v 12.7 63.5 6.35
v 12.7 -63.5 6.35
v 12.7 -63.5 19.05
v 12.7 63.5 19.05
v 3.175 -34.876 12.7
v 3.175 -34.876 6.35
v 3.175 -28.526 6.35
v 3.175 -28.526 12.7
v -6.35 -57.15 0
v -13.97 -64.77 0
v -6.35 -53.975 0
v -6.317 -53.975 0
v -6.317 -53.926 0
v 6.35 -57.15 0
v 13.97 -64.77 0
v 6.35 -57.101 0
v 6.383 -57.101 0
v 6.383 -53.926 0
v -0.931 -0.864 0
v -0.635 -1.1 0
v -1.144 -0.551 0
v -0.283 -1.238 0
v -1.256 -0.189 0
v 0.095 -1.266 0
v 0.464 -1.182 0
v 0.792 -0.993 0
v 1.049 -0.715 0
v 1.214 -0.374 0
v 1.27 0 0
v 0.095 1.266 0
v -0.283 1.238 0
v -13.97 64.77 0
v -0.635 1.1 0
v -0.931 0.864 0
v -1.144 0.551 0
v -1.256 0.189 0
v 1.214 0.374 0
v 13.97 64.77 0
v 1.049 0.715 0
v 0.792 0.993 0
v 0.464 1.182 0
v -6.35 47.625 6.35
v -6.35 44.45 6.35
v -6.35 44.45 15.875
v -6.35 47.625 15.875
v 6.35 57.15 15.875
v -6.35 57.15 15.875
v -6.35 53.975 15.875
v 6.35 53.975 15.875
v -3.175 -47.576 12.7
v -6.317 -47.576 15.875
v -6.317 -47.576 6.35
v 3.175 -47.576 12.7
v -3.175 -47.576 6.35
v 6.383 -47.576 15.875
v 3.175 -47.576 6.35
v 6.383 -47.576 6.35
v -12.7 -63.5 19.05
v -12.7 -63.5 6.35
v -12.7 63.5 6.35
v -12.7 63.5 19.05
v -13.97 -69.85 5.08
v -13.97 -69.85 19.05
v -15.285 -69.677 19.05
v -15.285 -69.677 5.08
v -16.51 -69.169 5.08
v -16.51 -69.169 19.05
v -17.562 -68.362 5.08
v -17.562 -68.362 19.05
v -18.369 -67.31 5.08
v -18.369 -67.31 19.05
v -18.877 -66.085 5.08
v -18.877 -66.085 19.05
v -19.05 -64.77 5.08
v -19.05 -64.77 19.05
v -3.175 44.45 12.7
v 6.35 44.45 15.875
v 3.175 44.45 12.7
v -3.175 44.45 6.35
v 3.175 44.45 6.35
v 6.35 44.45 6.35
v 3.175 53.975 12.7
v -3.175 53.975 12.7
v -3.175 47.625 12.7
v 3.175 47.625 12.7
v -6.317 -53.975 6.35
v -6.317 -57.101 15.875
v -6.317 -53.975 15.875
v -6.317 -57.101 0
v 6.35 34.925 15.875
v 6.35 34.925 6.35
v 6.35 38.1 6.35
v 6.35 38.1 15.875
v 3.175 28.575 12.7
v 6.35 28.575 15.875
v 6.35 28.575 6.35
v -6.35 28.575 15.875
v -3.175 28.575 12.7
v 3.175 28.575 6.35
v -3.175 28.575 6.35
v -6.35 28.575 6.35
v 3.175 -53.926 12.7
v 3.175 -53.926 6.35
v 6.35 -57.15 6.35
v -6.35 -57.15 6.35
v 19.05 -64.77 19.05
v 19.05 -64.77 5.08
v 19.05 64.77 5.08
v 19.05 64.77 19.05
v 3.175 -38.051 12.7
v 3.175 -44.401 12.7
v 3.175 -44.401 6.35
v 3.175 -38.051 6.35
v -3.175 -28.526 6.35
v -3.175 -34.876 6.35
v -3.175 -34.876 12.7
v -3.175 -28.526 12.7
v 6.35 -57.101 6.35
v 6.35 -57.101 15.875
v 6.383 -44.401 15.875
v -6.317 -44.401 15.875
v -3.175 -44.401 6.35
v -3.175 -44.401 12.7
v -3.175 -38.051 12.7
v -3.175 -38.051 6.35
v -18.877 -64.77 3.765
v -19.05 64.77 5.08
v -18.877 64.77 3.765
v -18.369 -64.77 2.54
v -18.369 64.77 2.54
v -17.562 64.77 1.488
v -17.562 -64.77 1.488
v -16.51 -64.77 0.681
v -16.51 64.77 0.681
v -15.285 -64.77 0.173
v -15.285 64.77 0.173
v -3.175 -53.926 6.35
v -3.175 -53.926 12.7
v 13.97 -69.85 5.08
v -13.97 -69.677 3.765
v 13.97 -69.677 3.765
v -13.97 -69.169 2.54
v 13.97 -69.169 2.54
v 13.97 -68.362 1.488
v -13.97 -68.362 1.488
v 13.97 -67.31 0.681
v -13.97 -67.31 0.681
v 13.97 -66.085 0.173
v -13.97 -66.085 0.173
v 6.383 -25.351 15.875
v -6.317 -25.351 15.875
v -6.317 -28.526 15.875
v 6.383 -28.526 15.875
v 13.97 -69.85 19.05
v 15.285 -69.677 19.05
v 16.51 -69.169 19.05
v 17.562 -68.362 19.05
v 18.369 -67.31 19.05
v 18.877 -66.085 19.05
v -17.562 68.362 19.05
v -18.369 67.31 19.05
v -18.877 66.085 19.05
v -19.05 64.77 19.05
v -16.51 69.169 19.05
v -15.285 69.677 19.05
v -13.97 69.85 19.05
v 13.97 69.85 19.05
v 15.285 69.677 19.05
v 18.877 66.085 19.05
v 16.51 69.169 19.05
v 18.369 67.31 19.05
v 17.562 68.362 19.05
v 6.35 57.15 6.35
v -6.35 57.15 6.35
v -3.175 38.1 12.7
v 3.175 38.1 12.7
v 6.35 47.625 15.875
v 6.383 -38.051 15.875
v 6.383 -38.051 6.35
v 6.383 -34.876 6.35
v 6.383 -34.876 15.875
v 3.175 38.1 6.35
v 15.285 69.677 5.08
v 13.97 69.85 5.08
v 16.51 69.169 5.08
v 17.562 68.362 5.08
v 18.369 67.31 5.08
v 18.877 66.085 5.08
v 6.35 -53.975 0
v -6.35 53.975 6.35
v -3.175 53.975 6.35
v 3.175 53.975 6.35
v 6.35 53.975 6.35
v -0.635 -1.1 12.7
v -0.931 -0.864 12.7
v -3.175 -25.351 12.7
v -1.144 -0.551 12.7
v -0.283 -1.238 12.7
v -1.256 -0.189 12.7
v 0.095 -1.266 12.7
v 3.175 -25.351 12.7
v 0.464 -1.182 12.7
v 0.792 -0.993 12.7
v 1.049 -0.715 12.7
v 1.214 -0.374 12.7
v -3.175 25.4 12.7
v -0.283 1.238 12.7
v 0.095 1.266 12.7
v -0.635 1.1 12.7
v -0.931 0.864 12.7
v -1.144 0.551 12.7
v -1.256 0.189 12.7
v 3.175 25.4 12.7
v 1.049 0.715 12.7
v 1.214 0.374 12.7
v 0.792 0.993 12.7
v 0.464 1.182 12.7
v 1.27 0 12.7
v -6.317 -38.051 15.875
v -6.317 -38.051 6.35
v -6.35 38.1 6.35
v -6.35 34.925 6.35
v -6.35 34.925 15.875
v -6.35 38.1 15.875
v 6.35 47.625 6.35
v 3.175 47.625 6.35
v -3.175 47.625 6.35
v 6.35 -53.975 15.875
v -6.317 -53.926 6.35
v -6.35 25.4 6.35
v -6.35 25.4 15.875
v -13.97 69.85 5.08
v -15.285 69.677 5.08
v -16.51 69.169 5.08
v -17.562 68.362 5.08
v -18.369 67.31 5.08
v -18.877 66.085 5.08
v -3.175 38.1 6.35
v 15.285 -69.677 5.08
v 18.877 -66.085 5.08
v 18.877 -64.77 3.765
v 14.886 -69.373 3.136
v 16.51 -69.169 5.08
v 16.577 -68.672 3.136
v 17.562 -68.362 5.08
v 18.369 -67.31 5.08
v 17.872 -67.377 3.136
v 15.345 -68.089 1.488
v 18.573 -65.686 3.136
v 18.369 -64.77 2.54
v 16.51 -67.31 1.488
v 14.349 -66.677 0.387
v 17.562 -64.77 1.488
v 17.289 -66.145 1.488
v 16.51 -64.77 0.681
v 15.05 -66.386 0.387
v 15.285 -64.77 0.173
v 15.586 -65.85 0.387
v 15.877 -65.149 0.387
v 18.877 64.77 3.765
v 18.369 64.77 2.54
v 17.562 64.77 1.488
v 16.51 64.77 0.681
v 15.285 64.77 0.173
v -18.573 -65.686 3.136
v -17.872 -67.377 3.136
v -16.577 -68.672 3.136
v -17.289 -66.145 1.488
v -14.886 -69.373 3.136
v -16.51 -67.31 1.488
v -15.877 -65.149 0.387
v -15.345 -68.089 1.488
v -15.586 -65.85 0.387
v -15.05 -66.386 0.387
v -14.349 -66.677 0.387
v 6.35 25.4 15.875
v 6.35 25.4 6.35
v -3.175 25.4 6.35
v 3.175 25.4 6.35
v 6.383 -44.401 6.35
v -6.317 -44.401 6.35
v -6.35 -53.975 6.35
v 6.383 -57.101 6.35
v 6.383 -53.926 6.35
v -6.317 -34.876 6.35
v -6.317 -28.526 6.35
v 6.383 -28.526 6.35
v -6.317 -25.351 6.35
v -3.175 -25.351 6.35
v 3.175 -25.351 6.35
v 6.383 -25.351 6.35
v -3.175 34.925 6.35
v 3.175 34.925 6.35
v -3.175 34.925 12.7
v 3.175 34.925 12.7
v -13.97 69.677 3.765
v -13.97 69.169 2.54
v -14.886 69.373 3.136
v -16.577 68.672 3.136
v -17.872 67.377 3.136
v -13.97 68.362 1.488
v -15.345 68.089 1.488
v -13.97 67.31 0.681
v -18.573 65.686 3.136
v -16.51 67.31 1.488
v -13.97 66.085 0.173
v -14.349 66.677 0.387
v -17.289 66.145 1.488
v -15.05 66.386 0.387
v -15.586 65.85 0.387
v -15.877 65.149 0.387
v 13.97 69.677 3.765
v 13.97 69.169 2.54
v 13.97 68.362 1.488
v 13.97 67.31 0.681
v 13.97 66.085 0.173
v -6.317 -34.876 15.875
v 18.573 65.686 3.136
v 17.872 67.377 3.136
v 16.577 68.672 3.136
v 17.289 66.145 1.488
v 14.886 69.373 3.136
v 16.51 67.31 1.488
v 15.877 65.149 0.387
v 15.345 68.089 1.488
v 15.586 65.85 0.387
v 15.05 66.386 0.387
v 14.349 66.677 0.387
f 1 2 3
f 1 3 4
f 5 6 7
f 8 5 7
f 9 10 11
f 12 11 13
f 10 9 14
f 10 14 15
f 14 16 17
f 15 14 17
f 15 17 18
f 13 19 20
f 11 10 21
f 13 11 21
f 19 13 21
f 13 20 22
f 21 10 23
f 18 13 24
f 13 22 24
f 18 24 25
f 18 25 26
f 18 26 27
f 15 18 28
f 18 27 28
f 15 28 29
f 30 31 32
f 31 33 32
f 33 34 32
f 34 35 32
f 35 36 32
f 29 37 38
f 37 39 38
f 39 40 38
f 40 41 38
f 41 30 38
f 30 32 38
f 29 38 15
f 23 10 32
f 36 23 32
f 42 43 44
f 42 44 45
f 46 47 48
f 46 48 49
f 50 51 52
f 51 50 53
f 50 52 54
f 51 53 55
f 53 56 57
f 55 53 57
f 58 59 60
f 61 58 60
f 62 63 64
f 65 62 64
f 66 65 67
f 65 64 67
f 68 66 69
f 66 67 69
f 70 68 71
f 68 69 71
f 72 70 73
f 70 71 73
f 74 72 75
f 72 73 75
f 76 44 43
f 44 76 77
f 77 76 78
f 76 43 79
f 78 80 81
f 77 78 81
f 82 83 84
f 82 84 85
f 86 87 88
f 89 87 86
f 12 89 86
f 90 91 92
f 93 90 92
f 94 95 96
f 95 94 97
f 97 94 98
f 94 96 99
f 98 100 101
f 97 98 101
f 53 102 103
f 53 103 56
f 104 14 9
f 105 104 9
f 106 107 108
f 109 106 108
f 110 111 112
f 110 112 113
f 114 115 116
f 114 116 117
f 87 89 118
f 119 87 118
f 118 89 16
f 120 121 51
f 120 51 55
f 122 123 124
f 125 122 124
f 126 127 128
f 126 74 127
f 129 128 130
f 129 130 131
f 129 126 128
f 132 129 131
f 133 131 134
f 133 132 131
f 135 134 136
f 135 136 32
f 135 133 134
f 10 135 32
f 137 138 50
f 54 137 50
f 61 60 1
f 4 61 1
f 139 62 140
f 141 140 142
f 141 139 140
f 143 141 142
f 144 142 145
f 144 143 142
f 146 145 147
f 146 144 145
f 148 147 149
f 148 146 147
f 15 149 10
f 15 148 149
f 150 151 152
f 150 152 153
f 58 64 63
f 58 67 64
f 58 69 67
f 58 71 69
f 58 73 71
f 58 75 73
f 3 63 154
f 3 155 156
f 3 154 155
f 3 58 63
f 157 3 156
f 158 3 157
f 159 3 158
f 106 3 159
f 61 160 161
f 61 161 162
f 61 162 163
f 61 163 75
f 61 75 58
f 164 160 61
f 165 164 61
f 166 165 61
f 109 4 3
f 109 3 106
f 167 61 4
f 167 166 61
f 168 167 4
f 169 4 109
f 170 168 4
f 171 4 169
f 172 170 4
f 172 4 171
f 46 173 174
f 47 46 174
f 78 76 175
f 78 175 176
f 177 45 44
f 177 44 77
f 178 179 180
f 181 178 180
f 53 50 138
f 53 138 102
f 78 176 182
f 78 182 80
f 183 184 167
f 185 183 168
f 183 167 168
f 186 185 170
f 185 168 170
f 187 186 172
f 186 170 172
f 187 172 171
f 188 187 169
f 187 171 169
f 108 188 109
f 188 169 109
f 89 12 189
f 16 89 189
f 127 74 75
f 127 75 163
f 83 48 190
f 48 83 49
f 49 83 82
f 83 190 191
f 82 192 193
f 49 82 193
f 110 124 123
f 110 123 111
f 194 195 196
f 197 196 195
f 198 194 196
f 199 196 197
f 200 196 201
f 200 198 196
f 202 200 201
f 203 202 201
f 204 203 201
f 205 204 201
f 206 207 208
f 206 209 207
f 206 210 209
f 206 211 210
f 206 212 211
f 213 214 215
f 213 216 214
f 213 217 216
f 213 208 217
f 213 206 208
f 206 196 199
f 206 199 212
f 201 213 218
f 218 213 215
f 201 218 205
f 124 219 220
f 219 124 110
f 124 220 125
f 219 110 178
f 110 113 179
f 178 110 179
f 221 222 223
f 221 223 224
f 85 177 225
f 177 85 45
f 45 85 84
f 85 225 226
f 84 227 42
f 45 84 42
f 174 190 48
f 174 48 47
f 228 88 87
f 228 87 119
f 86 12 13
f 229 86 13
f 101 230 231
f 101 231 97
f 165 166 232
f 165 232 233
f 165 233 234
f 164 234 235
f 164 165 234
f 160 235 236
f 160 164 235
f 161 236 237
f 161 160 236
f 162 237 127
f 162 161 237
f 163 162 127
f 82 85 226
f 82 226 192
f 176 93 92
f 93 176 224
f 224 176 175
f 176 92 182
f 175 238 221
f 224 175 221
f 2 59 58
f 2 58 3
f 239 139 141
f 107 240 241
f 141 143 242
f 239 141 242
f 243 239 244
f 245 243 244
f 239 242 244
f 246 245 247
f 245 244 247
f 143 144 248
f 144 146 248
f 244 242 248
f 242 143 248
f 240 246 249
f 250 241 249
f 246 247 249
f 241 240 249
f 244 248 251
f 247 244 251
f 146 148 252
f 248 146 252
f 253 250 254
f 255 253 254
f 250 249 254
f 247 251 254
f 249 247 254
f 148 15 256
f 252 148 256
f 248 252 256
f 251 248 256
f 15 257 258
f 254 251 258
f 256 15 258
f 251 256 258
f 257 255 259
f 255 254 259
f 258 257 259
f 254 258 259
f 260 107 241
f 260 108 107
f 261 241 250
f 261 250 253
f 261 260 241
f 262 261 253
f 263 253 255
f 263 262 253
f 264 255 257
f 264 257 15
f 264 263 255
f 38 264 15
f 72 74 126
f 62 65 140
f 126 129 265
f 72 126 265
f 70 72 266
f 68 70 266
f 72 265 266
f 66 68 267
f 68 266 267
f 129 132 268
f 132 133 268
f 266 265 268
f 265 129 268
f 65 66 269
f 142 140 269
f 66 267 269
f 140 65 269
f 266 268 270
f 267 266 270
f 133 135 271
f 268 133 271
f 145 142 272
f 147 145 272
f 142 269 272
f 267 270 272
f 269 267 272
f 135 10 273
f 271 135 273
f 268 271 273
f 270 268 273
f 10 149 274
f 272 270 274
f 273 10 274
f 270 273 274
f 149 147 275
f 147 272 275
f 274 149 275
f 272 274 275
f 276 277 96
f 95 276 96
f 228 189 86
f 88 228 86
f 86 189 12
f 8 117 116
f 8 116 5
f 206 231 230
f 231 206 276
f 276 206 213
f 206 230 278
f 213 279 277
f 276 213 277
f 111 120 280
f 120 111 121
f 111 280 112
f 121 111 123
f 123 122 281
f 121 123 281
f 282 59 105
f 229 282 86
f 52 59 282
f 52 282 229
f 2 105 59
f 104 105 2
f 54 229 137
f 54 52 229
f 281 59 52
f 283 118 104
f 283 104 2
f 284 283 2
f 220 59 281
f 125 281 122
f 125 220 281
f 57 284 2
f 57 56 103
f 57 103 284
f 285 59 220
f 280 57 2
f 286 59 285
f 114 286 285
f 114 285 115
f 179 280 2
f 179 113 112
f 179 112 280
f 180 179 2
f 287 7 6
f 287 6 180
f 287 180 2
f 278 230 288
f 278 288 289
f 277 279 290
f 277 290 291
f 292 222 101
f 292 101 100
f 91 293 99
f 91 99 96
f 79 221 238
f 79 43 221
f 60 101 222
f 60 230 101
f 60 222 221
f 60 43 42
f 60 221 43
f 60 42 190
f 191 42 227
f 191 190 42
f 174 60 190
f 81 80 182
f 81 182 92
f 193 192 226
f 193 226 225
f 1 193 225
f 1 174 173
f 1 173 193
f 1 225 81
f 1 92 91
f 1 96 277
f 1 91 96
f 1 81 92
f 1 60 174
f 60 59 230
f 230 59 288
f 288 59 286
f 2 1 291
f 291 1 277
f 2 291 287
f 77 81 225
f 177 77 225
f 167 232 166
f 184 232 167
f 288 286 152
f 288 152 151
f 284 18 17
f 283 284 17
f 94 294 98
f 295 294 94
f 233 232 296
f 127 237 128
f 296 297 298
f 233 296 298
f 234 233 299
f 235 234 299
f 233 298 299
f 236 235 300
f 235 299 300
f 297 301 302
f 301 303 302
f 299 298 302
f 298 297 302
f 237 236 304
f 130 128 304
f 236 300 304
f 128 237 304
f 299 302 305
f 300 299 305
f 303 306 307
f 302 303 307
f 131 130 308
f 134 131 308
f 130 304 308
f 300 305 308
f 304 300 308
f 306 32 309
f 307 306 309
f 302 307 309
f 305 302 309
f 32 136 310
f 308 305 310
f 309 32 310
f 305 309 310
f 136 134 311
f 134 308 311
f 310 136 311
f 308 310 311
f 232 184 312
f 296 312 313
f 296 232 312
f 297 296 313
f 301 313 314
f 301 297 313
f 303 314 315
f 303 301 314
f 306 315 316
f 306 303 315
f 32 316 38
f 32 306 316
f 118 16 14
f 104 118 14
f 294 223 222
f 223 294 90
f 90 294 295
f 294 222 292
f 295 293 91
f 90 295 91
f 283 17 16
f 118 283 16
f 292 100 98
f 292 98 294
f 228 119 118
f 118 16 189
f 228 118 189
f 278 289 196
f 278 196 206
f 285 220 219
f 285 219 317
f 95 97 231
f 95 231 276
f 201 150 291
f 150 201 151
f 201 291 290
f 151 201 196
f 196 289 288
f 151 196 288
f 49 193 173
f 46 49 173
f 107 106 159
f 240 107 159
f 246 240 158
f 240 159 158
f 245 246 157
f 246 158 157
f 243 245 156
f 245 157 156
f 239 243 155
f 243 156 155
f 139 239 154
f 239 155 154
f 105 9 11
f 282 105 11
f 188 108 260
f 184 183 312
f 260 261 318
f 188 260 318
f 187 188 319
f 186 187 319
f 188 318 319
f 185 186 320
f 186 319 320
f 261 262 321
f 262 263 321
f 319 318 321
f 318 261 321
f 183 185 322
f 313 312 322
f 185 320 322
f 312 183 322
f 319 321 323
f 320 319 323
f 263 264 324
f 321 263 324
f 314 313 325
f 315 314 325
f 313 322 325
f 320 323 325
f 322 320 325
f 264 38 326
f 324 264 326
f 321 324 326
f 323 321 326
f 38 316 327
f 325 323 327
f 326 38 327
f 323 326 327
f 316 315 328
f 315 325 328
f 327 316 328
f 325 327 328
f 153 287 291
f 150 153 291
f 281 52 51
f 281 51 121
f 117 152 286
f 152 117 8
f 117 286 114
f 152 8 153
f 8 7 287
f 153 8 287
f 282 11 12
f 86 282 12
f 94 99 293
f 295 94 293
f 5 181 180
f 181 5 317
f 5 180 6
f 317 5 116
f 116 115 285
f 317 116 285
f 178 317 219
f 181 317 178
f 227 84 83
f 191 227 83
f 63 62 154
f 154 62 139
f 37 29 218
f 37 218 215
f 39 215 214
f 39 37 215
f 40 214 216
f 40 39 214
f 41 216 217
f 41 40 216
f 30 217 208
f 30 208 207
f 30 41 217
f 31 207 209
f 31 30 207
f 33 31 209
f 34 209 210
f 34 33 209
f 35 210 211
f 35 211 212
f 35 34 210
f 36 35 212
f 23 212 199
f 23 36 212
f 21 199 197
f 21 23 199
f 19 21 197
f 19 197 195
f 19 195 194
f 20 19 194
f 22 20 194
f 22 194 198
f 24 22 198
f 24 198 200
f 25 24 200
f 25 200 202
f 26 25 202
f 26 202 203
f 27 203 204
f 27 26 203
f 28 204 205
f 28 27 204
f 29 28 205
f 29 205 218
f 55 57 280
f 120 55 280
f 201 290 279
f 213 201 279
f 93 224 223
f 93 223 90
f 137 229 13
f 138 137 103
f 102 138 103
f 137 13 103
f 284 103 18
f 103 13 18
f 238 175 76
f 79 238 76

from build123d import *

# Parameters (mm, degrees)
F0_W     = 38.1
F0_H     = 139.7
F0_W_2   = 25.4
F0_H_2   = 127
F1_DEPTH = 19.05
F2_DEPTH = 6.35
F0_W_3   = 6.35
F0_H_3   = 50.7511039019
F0_R     = 1.27
F0_H_4   = 6.35
F3_DEPTH = 12.7
F0_H_5   = 3.175
F0_W_4   = 3.175
F0_W_5   = 3.141760166
F0_W_6   = 3.208239834
F0_H_6   = 3.1261039019
F4_DEPTH = 15.875
F5_R     = 5.08
F6_R     = 5.08
F7_R     = 5.08
F8_R     = 5.08
F9_R     = 5.08


with BuildPart() as f1:
    # F0 (on Top) → F1 (new body)
    with BuildSketch(Plane.XY):
        Rectangle(F0_W, F0_H)
        Rectangle(F0_W_2, F0_H_2, mode=Mode.SUBTRACT)
    extrude(amount=F1_DEPTH)

    # F0 (on Top) → F2 (join)
    with BuildSketch(Plane.XY):
        Rectangle(F0_W_2, F0_H_2)
        Polygon((-3.175, 57.15), (3.175, 57.15), (6.35, 57.15), (6.35, 53.975), (3.175, 53.975), (3.175, 47.625), (6.35, 47.625), (6.35, 44.45), (3.175, 44.45), (3.175, 38.1), (6.35, 38.1), (6.35, 34.925), (3.175, 34.925), (3.175, 28.575), (6.35, 28.575), (6.35, 25.4), (3.175, 25.4), (3.175, -25.3511039019), (6.383239834, -25.3511039019), (6.383239834, -28.5261039019), (3.175, -28.5261039019), (3.175, -34.8761039019), (6.383239834, -34.8761039019), (6.383239834, -38.0511039019), (3.175, -38.0511039019), (3.175, -44.4011039019), (6.383239834, -44.4011039019), (6.383239834, -47.5761039019), (3.175, -47.5761039019), (3.175, -53.9261039019), (6.383239834, -53.9261039019), (6.383239834, -57.1011039019), (6.35, -57.1011039019), (6.35, -57.15), (3.175, -57.15), (-3.175, -57.15), (-6.35, -57.15), (-6.35, -53.975), (-6.316760166, -53.975), (-6.316760166, -53.9261039019), (-3.175, -53.9261039019), (-3.175, -47.5761039019), (-6.316760166, -47.5761039019), (-6.316760166, -44.4011039019), (-3.175, -44.4011039019), (-3.175, -38.0511039019), (-6.316760166, -38.0511039019), (-6.316760166, -34.8761039019), (-3.175, -34.8761039019), (-3.175, -28.5261039019), (-6.316760166, -28.5261039019), (-6.316760166, -25.3511039019), (-3.175, -25.3511039019), (-3.175, 25.4), (-6.35, 25.4), (-6.35, 28.575), (-3.175, 28.575), (-3.175, 34.925), (-6.35, 34.925), (-6.35, 38.1), (-3.175, 38.1), (-3.175, 44.45), (-6.35, 44.45), (-6.35, 47.625), (-3.175, 47.625), (-3.175, 53.975), (-6.35, 53.975), (-6.35, 57.15), align=None, mode=Mode.SUBTRACT)
    extrude(amount=F2_DEPTH)

    # F0 (on Top) → F3 (join)
    with BuildSketch(Plane.XY):
        with Locations((0, 0.0244480491)):
            Rectangle(F0_W_3, F0_H_3)
        Circle(F0_R, mode=Mode.SUBTRACT)
        with Locations((0, 31.75)):
            Rectangle(F0_W_3, F0_H_4)
        with Locations((0, 41.275)):
            Rectangle(F0_W_3, F0_H_4)
        with Locations((0, 50.8)):
            Rectangle(F0_W_3, F0_H_4)
        with Locations((0, -31.7011039019)):
            Rectangle(F0_W_3, F0_H_4)
        with Locations((0, -41.2261039019)):
            Rectangle(F0_W_3, F0_H_4)
        with Locations((0, -50.7511039019)):
            Rectangle(F0_W_3, F0_H_4)
    extrude(amount=F3_DEPTH)

    # F0 (on Top) → F4 (join)
    with BuildSketch(Plane.XY):
        with Locations((0, 55.5625)):
            Rectangle(F0_W_3, F0_H_5)
        with Locations((4.7625, 55.5625)):
            Rectangle(F0_W_4, F0_H_5)
        with Locations((-4.7625, 55.5625)):
            Rectangle(F0_W_4, F0_H_5)
        with Locations((-4.7625, 46.0375)):
            Rectangle(F0_W_4, F0_H_5)
        with Locations((0, 46.0375)):
            Rectangle(F0_W_3, F0_H_5)
        with Locations((4.7625, 46.0375)):
            Rectangle(F0_W_4, F0_H_5)
        with Locations((4.7625, 36.5125)):
            Rectangle(F0_W_4, F0_H_5)
        with Locations((0, 36.5125)):
            Rectangle(F0_W_3, F0_H_5)
        with Locations((-4.7625, 36.5125)):
            Rectangle(F0_W_4, F0_H_5)
        with Locations((-4.7625, 26.9875)):
            Rectangle(F0_W_4, F0_H_5)
        with Locations((0, 26.9875)):
            Rectangle(F0_W_3, F0_H_5)
        with Locations((4.7625, 26.9875)):
            Rectangle(F0_W_4, F0_H_5)
        with Locations((0, -26.9386039019)):
            Rectangle(F0_W_3, F0_H_5)
        with Locations((-4.745880083, -26.9386039019)):
            Rectangle(F0_W_5, F0_H_5)
        with Locations((4.779119917, -26.9386039019)):
            Rectangle(F0_W_6, F0_H_5)
        with Locations((4.779119917, -36.4636039019)):
            Rectangle(F0_W_6, F0_H_5)
        with Locations((0, -36.4636039019)):
            Rectangle(F0_W_3, F0_H_5)
        with Locations((-4.745880083, -36.4636039019)):
            Rectangle(F0_W_5, F0_H_5)
        with Locations((0, -45.9886039019)):
            Rectangle(F0_W_3, F0_H_5)
        with Locations((0, -55.5380519509)):
            Rectangle(F0_W_3, F0_H_6)
        with Locations((4.779119917, -45.9886039019)):
            Rectangle(F0_W_6, F0_H_5)
        with Locations((4.7625, -55.5380519509)):
            Rectangle(F0_W_4, F0_H_6)
        with Locations((-4.745880083, -55.5380519509)):
            Rectangle(F0_W_5, F0_H_6)
        with Locations((-4.745880083, -45.9886039019)):
            Rectangle(F0_W_5, F0_H_5)
    extrude(amount=F4_DEPTH)

    # F5
    f5_edges = [f1.edges().sort_by_distance(p)[0] for p in [
        (19.05, 69.85, 9.525),
    ]]
    fillet(f5_edges, radius=F5_R)

    # F6
    f6_edges = [f1.edges().sort_by_distance(p)[0] for p in [
        (-19.05, 69.85, 9.525),
    ]]
    fillet(f6_edges, radius=F6_R)

    # F7
    f7_edges = [f1.edges().sort_by_distance(p)[0] for p in [
        (19.05, -69.85, 9.525),
    ]]
    fillet(f7_edges, radius=F7_R)

    # F8
    f8_edges = [f1.edges().sort_by_distance(p)[0] for p in [
        (-19.05, -69.85, 9.525),
    ]]
    fillet(f8_edges, radius=F8_R)

    # F9
    f9_edges = [f1.edges().sort_by_distance(p)[0] for p in [
        (0, -69.85, 0),
    ]]
    fillet(f9_edges, radius=F9_R)


solid = f1.part
